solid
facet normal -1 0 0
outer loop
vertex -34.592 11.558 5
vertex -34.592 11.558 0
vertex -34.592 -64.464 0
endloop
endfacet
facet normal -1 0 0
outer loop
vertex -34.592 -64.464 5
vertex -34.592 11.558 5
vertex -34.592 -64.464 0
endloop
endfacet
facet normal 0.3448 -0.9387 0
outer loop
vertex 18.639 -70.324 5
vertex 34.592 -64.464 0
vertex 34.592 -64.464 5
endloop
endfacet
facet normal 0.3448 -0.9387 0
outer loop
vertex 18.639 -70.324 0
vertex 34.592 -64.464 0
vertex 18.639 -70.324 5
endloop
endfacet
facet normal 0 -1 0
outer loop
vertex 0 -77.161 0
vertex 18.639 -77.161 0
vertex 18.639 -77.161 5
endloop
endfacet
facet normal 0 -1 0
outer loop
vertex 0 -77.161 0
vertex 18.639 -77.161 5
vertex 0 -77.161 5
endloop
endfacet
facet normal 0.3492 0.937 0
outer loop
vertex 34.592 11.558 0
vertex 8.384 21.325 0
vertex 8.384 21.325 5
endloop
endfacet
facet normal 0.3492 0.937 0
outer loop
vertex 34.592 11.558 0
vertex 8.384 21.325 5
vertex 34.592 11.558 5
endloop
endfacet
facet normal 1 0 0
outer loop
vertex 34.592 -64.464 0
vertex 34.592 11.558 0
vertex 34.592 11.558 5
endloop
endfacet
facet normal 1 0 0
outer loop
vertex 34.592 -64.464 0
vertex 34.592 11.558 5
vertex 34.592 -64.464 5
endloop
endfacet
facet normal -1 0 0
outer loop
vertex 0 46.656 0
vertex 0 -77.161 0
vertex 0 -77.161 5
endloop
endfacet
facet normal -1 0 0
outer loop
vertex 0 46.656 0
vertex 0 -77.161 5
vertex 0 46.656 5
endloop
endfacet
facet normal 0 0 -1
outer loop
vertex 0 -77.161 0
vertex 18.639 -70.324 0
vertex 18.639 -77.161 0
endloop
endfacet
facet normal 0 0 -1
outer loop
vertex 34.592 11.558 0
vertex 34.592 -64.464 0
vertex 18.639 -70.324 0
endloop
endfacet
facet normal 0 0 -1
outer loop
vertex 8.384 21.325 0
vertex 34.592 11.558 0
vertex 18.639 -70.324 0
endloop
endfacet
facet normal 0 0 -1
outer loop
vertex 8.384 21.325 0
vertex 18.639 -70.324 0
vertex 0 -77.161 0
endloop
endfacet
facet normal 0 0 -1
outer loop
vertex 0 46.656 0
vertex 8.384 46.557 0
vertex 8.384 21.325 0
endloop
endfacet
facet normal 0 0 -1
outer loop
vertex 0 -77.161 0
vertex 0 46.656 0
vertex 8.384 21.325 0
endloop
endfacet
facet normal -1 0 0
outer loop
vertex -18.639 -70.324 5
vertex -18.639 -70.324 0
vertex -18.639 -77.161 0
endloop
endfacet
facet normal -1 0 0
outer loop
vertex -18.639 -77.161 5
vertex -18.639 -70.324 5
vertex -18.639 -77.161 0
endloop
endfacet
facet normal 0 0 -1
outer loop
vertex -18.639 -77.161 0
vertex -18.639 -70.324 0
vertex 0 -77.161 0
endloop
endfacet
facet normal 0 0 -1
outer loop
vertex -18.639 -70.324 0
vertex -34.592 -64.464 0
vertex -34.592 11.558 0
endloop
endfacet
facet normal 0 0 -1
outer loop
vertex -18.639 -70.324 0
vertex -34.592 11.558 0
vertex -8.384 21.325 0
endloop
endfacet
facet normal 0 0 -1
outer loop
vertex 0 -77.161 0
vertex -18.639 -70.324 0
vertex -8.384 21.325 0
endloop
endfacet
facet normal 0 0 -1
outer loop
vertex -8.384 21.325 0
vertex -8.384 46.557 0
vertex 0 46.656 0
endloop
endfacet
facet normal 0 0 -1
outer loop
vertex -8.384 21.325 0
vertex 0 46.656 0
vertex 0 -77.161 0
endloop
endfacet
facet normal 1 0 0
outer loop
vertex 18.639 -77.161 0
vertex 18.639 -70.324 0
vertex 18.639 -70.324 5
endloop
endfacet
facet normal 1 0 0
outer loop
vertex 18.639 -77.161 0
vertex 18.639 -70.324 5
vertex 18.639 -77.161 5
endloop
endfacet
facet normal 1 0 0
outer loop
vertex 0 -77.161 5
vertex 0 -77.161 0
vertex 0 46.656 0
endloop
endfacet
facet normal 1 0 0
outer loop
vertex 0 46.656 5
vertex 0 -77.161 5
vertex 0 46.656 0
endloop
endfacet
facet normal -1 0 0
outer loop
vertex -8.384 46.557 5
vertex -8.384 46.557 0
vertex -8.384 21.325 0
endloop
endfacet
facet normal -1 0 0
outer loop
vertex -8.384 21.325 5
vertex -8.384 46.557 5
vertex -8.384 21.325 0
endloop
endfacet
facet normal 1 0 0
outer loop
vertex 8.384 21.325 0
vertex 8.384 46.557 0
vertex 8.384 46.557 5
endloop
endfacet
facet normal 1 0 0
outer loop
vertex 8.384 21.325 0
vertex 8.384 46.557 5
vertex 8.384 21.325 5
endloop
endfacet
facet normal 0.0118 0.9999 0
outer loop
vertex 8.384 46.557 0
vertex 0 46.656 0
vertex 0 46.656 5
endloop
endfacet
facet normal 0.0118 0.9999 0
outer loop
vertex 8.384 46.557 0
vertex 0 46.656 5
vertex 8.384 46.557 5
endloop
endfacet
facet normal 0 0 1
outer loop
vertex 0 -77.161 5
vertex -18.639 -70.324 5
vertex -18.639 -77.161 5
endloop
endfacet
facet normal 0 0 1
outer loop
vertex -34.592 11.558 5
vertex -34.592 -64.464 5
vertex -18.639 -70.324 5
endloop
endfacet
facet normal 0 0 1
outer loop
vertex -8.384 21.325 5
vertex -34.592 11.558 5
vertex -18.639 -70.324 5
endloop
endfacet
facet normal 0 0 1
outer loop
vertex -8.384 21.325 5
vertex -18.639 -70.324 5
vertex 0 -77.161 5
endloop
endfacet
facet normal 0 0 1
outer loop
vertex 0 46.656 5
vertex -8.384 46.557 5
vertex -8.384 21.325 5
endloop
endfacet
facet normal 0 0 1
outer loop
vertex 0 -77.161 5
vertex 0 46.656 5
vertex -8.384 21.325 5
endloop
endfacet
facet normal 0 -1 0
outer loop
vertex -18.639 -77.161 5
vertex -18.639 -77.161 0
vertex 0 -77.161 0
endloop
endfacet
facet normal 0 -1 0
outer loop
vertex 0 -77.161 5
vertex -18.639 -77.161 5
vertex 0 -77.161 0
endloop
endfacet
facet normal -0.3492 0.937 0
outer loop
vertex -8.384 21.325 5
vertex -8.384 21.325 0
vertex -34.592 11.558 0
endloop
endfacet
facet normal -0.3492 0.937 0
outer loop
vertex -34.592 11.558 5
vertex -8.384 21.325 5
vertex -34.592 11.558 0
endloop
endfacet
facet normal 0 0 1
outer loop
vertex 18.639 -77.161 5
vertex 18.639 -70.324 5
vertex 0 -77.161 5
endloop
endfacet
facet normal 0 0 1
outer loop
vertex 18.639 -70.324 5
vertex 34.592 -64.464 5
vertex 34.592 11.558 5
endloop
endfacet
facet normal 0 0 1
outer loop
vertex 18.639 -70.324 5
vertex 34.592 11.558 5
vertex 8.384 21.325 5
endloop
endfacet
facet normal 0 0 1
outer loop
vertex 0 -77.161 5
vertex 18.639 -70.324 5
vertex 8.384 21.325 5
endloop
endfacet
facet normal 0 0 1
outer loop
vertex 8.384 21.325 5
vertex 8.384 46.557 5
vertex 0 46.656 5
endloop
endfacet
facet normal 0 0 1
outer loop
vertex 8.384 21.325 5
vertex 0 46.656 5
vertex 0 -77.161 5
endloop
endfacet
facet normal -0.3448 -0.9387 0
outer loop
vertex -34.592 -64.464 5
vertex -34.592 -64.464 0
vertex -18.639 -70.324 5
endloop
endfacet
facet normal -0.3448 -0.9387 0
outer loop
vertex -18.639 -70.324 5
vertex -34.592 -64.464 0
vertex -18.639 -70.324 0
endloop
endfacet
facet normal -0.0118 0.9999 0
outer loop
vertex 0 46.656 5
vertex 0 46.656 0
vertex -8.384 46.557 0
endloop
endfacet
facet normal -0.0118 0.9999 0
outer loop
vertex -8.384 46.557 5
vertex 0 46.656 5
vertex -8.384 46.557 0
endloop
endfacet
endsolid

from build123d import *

# Parameters (mm, degrees)
F1_DEPTH = 5


# Not quite as in the source:
# - a pattern or mirror of a feature is missing from the dataset's text; its kind, count and spacing are read off the source's solid
# - a feature names something its author has since deleted; it is built from what else it names


with BuildPart() as f1:
    # F0 (on Top) → F1 (new body)
    with BuildSketch(Plane.XY):
        Polygon((0, 46.6559864581), (-8.3835506812, 46.5571954846), (-8.3835506812, 21.3251467794), (-34.5923192799, 11.5579040721), (-34.5923192799, -64.463801682), (-18.6391565949, -70.3241527081), (-18.6391565949, -77.1612226963), (0, -77.1612226963), align=None)
    extrude(amount=F1_DEPTH)


with BuildPart() as f1_copies_1:
    # F1_copies: instance of F1
    add(f1.part.mirror(Plane(origin=(0, 0, 0), x_dir=(0, 0, 1), z_dir=(1, 0, 0))))


solid = Compound([f1.part, f1_copies_1.part])
